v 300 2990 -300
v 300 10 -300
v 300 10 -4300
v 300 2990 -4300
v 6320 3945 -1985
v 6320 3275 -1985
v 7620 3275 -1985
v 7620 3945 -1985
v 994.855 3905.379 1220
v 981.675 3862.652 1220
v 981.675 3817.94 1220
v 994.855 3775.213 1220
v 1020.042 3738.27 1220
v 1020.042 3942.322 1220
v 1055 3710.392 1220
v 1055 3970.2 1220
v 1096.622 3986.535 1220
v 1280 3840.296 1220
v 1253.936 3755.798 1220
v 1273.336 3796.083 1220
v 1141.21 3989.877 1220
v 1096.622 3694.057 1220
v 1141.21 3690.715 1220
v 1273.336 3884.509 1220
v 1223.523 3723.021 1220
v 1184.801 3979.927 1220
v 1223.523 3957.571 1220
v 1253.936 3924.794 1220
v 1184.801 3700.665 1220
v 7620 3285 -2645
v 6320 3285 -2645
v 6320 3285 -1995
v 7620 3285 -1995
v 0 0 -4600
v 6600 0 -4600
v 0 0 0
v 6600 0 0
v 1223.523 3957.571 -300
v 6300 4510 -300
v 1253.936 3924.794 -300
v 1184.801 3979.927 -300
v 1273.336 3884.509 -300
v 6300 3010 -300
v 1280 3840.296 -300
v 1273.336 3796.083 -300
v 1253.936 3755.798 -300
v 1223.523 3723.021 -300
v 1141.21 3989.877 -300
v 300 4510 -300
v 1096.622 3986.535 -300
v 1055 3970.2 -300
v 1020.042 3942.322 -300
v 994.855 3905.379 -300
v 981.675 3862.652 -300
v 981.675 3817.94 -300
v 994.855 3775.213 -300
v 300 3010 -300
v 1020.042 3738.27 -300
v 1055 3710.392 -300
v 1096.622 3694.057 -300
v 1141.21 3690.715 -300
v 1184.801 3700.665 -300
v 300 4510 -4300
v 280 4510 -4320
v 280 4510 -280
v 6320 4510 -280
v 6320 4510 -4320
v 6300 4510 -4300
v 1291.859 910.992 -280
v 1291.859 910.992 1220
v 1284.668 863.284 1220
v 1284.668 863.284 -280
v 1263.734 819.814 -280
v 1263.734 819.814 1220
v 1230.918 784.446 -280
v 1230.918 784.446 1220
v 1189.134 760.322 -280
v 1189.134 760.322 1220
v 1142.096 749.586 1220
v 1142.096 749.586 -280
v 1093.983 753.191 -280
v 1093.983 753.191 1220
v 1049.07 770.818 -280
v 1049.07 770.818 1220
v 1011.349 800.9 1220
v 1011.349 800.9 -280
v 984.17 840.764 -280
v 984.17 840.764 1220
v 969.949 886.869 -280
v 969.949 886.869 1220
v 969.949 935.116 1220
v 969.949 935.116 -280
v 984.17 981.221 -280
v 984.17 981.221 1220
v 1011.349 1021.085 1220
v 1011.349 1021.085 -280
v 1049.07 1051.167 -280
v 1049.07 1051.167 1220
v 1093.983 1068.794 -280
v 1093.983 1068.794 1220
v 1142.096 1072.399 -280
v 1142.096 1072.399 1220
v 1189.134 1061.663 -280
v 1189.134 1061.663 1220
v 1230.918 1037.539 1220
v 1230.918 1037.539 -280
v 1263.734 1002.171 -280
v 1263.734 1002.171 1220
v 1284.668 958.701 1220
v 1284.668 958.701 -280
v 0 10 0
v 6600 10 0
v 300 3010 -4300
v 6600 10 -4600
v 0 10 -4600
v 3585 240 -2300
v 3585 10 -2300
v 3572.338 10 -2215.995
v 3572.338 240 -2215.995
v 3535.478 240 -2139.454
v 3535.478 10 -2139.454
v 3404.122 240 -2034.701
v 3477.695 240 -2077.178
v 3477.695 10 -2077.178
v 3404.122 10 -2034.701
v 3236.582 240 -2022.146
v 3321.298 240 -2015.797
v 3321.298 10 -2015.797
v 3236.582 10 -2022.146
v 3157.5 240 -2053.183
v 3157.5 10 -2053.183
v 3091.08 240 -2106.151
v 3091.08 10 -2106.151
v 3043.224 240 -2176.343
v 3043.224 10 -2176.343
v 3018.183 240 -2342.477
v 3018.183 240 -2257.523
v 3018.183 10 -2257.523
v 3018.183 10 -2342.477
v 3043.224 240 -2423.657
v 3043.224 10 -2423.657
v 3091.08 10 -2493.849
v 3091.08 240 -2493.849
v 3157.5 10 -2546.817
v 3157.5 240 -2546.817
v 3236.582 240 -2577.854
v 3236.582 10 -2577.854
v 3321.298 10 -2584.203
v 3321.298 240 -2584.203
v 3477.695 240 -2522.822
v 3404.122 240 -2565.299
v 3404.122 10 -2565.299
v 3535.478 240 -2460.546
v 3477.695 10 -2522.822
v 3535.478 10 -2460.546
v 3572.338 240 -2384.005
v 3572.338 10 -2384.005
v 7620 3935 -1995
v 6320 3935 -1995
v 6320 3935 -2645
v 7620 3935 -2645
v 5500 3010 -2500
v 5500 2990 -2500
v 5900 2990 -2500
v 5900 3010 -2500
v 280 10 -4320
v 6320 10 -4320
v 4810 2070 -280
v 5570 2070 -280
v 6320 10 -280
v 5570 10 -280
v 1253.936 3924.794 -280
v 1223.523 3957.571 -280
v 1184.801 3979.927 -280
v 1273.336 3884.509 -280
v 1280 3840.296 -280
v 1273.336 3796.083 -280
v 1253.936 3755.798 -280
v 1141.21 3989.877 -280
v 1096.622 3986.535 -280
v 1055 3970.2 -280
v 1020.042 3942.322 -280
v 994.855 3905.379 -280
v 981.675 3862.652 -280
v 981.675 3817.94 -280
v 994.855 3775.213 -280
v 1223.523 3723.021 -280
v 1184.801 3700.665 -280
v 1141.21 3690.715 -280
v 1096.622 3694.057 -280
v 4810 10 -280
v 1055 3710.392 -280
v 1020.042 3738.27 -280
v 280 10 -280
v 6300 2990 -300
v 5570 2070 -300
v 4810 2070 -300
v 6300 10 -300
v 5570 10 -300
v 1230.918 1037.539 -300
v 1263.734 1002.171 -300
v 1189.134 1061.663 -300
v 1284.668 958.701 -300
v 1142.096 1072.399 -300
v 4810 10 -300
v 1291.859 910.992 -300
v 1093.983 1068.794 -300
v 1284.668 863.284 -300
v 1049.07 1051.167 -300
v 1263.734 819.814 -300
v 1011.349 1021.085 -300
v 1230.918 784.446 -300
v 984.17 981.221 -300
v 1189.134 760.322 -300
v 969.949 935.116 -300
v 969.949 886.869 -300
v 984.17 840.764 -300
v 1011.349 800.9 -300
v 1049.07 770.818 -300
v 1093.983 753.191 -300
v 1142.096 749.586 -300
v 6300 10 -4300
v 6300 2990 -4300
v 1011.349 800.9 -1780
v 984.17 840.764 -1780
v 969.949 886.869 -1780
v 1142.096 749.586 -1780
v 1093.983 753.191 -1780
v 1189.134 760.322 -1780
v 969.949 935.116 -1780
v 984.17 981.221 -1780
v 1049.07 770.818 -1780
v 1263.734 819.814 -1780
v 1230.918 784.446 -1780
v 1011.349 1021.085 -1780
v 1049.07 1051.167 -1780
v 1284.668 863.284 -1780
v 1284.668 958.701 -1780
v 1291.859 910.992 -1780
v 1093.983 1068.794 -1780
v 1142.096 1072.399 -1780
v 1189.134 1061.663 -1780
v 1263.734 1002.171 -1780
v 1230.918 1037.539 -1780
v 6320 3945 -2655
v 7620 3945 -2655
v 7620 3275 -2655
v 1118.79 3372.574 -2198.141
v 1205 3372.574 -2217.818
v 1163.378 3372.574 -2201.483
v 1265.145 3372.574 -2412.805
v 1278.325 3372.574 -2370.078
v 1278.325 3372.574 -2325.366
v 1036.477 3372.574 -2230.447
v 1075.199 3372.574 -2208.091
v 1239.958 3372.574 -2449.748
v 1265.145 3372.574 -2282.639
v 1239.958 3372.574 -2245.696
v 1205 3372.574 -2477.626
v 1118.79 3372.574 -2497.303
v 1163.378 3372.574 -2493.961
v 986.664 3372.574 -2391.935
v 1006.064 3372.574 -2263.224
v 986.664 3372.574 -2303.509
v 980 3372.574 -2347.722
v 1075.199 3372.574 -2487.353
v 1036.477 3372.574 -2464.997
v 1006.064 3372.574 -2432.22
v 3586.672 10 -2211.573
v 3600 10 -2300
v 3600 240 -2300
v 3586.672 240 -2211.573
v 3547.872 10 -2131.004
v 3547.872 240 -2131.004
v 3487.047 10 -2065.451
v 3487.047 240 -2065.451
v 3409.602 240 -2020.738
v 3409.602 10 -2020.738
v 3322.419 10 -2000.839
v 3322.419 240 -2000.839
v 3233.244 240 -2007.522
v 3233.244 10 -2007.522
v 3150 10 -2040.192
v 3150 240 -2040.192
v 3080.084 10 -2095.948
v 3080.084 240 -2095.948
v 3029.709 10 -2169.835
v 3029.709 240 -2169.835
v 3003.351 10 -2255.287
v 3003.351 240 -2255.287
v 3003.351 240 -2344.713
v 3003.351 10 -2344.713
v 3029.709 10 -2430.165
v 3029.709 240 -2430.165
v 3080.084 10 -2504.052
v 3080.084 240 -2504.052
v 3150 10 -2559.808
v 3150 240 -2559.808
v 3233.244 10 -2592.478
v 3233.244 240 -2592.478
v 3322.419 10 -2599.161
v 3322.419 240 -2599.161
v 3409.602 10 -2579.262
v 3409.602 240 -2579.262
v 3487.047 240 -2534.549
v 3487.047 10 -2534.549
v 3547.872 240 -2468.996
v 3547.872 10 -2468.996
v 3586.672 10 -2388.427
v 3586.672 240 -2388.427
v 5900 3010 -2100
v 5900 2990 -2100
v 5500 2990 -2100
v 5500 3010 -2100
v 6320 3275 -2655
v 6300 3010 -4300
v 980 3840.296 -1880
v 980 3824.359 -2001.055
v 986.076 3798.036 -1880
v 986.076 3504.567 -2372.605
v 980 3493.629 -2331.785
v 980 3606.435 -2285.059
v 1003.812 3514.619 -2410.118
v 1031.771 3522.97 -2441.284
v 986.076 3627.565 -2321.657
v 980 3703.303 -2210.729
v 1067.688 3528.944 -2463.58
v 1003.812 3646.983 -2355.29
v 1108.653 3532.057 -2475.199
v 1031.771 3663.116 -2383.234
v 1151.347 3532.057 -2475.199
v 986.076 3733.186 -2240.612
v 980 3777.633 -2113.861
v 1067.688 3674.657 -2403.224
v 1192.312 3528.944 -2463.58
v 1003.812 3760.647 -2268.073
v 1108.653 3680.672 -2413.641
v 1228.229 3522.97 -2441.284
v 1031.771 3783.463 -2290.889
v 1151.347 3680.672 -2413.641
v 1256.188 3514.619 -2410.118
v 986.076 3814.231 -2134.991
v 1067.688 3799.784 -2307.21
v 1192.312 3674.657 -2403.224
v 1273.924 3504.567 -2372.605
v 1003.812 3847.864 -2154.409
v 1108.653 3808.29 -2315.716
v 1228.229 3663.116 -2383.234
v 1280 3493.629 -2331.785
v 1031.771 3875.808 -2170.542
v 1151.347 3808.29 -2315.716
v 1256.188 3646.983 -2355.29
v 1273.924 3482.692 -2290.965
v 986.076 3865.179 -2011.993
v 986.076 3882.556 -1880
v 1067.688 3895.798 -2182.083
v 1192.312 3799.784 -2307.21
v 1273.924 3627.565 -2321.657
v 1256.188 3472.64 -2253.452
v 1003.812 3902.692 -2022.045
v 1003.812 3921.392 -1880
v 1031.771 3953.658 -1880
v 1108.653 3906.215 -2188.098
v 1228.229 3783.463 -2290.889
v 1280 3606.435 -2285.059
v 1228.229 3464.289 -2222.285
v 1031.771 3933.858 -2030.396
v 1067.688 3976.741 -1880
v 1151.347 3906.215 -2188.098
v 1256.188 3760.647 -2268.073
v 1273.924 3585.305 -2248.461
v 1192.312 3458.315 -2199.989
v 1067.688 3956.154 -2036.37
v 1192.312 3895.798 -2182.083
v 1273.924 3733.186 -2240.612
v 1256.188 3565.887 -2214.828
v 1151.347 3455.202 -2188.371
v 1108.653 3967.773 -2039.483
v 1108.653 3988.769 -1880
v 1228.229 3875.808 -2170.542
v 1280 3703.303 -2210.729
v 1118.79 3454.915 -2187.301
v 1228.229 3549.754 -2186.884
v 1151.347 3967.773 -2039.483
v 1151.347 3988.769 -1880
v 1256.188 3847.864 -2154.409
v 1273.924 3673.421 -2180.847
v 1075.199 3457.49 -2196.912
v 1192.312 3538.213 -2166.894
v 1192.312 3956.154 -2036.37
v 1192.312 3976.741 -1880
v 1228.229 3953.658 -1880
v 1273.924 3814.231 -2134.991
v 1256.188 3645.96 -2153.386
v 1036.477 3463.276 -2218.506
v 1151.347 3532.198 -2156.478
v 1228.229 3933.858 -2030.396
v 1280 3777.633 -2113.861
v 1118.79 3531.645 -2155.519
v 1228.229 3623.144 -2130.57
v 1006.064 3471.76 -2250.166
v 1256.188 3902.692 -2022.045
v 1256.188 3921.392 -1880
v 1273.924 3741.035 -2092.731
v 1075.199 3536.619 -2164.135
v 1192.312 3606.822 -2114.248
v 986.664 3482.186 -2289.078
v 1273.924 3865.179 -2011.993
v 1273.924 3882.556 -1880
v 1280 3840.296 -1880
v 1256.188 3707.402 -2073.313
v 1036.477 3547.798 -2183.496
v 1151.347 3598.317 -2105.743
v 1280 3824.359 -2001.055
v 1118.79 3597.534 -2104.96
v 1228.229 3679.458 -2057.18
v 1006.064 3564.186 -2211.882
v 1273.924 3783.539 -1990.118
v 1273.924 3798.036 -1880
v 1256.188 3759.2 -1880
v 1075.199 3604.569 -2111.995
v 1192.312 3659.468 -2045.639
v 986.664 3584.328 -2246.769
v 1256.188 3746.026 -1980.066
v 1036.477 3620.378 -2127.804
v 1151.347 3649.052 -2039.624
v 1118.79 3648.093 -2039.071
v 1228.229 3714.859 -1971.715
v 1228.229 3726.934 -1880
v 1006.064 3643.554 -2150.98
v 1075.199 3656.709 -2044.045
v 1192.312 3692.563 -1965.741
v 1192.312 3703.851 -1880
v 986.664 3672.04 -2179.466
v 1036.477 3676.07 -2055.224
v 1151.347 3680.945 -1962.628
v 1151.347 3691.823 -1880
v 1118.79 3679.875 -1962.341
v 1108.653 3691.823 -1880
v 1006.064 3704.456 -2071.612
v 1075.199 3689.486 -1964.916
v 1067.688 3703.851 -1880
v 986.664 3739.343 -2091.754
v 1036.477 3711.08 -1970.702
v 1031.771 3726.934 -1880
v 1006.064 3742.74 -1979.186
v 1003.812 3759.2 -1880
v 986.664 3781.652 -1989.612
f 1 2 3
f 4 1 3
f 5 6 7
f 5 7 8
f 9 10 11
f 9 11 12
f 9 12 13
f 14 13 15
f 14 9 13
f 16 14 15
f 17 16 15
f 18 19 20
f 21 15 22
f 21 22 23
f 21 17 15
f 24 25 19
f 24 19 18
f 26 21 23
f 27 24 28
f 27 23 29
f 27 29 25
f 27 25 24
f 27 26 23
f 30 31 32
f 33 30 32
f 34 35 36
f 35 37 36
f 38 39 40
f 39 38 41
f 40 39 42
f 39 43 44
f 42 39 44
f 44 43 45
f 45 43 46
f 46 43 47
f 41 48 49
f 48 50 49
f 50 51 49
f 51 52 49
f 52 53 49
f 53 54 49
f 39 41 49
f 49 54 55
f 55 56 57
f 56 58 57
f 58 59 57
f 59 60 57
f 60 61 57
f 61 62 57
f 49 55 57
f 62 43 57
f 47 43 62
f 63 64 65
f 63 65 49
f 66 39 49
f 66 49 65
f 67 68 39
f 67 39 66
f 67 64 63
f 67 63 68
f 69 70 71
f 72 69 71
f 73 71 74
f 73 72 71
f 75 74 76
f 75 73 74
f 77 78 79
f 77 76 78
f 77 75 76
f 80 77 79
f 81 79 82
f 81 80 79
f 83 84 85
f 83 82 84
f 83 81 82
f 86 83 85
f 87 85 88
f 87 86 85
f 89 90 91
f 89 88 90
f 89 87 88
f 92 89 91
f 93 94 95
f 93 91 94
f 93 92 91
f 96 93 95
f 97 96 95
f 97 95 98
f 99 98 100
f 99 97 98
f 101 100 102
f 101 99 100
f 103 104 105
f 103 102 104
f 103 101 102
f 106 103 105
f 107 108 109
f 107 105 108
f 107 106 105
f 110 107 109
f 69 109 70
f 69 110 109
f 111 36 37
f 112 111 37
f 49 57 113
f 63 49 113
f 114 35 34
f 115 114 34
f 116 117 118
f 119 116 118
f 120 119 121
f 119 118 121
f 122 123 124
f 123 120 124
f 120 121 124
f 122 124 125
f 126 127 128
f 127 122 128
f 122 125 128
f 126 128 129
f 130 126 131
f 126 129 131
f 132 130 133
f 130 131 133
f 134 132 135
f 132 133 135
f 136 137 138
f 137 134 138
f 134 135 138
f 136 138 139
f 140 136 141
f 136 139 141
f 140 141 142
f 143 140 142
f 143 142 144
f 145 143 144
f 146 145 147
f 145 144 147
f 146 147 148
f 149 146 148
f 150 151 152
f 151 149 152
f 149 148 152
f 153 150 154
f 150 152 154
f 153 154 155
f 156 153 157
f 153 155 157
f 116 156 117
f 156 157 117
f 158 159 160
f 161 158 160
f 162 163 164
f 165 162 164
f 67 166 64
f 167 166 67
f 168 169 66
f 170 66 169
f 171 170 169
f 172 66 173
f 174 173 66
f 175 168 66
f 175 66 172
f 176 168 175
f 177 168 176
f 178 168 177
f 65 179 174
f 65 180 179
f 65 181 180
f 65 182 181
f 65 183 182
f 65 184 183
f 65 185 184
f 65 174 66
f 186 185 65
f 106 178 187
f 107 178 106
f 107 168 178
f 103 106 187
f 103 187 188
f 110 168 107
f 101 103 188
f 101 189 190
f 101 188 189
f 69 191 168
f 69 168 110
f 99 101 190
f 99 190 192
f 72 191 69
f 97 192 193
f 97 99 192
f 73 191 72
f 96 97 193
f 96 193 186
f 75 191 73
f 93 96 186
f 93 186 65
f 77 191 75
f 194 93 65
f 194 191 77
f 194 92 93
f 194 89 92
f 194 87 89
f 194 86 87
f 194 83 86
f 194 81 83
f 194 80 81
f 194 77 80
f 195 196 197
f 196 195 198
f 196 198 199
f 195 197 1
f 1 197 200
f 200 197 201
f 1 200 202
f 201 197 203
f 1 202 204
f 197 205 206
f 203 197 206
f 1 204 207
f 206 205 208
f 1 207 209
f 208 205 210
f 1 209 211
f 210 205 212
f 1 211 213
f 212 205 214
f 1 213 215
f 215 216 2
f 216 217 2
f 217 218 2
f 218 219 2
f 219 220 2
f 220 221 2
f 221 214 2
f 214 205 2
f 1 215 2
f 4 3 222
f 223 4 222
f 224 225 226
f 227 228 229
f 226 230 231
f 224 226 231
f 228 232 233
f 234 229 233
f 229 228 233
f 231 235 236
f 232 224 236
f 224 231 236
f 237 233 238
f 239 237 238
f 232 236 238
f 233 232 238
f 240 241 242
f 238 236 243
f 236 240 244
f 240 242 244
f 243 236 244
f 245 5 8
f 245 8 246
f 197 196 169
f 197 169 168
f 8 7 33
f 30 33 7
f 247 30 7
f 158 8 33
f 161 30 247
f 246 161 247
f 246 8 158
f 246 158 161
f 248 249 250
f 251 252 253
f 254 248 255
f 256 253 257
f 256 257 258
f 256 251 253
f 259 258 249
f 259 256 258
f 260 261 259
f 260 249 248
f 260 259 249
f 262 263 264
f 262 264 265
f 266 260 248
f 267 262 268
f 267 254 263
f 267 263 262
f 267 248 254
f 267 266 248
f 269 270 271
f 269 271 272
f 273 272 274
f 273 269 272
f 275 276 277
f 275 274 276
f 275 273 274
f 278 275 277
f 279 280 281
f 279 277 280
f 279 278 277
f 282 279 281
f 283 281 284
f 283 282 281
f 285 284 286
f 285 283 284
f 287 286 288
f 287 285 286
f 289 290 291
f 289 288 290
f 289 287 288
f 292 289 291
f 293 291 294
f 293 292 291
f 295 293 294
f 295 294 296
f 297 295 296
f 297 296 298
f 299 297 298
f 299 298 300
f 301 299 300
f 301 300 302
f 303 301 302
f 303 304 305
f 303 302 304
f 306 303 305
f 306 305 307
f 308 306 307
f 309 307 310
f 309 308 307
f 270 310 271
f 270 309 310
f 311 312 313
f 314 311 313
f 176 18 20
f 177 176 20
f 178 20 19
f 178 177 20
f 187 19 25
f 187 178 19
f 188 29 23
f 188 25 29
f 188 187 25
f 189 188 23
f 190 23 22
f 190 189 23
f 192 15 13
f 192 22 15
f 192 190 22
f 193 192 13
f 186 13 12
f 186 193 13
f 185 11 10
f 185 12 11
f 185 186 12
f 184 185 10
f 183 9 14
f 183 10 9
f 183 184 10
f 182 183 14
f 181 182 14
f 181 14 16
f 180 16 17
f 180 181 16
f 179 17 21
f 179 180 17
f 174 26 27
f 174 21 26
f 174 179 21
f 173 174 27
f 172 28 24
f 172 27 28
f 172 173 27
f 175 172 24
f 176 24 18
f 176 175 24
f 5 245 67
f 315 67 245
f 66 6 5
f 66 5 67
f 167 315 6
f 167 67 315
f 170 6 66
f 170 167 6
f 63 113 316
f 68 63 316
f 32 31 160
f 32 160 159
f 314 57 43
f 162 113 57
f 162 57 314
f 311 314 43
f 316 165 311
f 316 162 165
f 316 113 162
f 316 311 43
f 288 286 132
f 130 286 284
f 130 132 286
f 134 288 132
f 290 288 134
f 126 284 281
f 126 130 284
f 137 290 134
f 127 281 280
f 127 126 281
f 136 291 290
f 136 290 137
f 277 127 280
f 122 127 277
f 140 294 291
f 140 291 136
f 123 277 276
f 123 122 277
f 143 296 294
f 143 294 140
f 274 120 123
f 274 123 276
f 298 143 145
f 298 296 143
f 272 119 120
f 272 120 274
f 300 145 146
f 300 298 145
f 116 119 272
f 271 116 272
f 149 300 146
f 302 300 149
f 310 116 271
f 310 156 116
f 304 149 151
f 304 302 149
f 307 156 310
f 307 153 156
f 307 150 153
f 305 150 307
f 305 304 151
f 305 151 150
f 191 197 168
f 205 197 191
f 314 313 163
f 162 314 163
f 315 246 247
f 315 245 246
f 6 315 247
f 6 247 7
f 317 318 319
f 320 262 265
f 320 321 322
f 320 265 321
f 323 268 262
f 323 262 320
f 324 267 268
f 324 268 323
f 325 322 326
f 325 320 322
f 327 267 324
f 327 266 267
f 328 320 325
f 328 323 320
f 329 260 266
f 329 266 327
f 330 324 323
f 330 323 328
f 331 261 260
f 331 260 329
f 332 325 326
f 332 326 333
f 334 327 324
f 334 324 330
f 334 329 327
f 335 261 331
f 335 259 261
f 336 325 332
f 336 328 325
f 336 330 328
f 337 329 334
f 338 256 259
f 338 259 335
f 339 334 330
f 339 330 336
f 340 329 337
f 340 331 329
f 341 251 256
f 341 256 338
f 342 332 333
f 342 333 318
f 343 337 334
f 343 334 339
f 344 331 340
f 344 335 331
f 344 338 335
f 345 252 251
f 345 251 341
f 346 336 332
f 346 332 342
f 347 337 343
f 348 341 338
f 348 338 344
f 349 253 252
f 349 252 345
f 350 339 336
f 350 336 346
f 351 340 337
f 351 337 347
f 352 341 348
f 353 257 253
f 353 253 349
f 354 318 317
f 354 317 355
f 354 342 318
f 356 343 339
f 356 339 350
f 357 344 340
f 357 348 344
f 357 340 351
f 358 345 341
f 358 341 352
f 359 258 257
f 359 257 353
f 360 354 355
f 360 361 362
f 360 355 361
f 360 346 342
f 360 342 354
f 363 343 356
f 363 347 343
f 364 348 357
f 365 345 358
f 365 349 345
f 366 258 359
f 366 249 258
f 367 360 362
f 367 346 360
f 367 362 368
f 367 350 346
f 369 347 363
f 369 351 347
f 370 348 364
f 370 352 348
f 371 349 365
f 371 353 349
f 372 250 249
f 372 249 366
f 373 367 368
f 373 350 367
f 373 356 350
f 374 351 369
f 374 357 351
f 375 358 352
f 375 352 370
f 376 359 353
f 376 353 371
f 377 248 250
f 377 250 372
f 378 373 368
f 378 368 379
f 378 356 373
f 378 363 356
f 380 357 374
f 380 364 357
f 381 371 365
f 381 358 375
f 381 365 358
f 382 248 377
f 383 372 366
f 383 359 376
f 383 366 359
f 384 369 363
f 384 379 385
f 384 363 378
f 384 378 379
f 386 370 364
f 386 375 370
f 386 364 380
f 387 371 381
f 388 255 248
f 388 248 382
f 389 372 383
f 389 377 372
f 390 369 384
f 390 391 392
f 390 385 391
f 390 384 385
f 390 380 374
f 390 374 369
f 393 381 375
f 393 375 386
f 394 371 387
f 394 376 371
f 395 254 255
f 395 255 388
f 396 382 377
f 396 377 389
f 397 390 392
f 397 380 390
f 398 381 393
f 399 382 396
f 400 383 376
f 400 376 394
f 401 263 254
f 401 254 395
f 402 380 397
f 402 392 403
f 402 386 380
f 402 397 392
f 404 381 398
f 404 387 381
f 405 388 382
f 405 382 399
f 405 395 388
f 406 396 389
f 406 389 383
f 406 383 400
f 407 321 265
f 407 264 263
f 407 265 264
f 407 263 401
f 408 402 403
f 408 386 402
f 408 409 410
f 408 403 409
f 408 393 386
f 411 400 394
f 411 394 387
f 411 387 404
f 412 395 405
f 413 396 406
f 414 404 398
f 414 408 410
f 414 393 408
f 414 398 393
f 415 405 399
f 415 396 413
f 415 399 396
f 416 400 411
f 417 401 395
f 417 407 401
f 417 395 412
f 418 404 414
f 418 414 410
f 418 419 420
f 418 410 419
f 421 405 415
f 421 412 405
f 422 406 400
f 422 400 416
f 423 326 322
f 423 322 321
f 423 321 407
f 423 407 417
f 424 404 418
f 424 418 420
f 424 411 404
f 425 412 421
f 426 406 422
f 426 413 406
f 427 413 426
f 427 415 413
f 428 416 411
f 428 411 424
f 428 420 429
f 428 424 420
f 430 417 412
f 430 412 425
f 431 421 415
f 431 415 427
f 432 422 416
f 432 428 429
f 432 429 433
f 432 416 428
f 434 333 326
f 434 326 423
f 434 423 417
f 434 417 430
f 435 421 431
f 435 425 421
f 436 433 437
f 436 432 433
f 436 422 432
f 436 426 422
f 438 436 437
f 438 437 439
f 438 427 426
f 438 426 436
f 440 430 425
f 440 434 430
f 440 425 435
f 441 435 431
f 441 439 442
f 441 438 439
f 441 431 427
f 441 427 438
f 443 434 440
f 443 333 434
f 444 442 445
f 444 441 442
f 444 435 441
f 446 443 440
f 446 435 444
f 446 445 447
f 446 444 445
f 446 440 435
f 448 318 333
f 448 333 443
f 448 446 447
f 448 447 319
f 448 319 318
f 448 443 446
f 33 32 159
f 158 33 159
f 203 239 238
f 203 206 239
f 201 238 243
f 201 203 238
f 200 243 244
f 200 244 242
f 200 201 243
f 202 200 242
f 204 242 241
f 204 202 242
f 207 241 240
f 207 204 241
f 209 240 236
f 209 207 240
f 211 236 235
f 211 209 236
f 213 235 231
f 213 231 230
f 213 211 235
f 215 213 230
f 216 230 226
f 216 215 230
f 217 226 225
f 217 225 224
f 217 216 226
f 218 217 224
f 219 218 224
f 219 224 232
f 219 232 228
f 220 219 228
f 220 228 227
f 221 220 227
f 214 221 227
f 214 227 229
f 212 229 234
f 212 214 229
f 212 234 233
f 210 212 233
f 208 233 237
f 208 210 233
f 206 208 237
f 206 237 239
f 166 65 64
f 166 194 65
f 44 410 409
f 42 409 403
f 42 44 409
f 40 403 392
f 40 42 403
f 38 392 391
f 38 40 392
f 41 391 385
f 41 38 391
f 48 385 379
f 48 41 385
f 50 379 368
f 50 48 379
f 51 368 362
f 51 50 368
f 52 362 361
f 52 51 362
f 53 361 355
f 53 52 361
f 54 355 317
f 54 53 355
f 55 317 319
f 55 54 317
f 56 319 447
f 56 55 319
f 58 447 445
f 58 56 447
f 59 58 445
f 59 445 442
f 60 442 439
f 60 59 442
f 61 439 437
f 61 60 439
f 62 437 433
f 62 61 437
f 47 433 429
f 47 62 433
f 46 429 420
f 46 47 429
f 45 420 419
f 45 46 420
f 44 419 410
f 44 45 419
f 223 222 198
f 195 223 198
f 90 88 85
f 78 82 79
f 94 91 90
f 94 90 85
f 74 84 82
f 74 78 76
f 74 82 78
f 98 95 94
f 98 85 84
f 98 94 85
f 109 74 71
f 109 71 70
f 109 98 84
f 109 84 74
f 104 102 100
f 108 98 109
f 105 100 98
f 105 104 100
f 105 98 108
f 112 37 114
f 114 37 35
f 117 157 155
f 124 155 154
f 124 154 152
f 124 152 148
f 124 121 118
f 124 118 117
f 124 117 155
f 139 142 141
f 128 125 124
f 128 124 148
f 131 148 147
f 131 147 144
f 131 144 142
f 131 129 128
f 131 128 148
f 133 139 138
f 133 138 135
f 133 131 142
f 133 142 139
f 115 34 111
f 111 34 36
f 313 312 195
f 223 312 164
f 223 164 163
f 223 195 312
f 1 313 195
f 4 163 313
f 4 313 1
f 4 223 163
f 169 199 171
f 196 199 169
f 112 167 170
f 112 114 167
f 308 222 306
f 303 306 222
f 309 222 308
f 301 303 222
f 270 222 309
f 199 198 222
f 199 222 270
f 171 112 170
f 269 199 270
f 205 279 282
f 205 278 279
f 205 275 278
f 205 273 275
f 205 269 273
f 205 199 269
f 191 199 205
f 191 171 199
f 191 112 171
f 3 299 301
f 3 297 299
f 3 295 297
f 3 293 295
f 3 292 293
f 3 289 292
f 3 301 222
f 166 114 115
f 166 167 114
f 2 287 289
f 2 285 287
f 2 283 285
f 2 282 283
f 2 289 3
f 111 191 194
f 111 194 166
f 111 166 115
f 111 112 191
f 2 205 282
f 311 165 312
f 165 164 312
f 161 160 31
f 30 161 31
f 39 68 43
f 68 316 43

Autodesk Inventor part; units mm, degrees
ref_plane "YZ Plane" through (0, 0, 0) normal (1, 0, 0) x (0, 1, 0)
ref_plane "XZ Plane" through (0, 0, 0) normal (0, 1, 0) x (-1, 0, 0)
ref_plane "XY Plane" through (0, 0, 0) normal (0, 0, 1) x (1, 0, 0)
sketch "Sketch1" plane through (0, 0, 0) normal (0, 1, 0) x (-1, 0, 0)
  line L0 (0, 0) -> (-6600, 0)
  line L1 (-6600, 0) -> (-6600, -4600)
  line L2 (-6600, -4600) -> (0, -4600)
  line L3 (0, -4600) -> (0, 0)
  dimension "d0" = 6600
  dimension "d2" = 4600
extrude "Extrusion1" add sketch "Sketch1" along normal blind 10
sketch "Sketch2" plane through (0, 10, 0) normal (0, 1, 0) x (1, 0, 0)
  line L0 (0, 0) -> (6600, 0) projected
  line L1 (6600, 0) -> (6600, 4600) projected
  line L2 (6600, 4600) -> (0, 4600) projected
  line L3 (0, 4600) -> (0, 0) projected
  line L4 (300, 4300) -> (6300, 4300)
  line L5 (6300, 4300) -> (6300, 300)
  line L6 (6300, 300) -> (300, 300)
  line L7 (300, 300) -> (300, 4300)
  line L8 (280, 4320) -> (6320, 4320)
  line L9 (6320, 4320) -> (6320, 280)
  line L10 (6320, 280) -> (280, 280)
  line L11 (280, 280) -> (280, 4320)
  dimension "d5" = 300
  dimension "d6" = 300
  dimension "d7" = 300
  dimension "d8" = 300
  dimension "d9" = 20
  dimension "d10" = 20
  dimension "d11" = 20
  dimension "d12" = 20
extrude "Extrusion2" add sketch "Sketch2" along normal blind 4500 contours L8 L9 L10 L11
sketch "Sketch3" plane through (280, 10, -280) normal (0, 0, 1) x (1, 0, 0)
  line L0 (6040, 0) -> (0, 0) projected
  line L1 (6040, 0) -> (6040, 4500) projected
  line L2 (4530, 0) -> (5290, 0)
  line L3 (5290, 0) -> (5290, 2060)
  line L4 (5290, 2060) -> (4530, 2060)
  line L5 (4530, 2060) -> (4530, 0)
  point P0 (-280, -10)
  dimension "d15" = 750
  dimension "d16" = 760
  dimension "d17" = 2060
extrude "Extrusion3" cut sketch "Sketch3" along normal mid plane 40
sketch "Sketch4" plane through (300, 10, -4300) normal (0, 0, 1) x (1, 0, 0)
  line L0 (6000, 0) -> (0, 0) projected
  line L1 (6000, 0) -> (6000, 4500) projected
  line L2 (0, 4500) -> (6000, 4500) projected
  line L3 (0, 0) -> (0, 4500) projected
  point P0 (-300, -10)
sketch "Sketch5" plane through (300, 10, -4300) normal (0, 0, 1) x (1, 0, 0)
  line L0 (6000, 0) -> (6000, 4500) projected
  line L1 (0, 4500) -> (6000, 4500) projected
  line L2 (0, 0) -> (0, 4500) projected
  line L3 (0, 3000) -> (6000, 3000)
  line L4 (6000, 3000) -> (6000, 2980)
  line L5 (6000, 2980) -> (0, 2980)
  line L6 (0, 2980) -> (0, 3000)
  point P0 (-300, -10)
  dimension "d20" = 1500
  dimension "d21" = 20
extrude "Extrusion4" add sketch "Sketch5" along normal up to next contours L5 L2 L3 L0
sketch "Sketch7" plane through (300, 3010, -4300) normal (0, 1, 0) x (1, 0, 0)
  line L0 (6000, -4000) -> (0, -4000) projected
  line L1 (6000, 0) -> (6000, -4000) projected
  line L2 (5200, -1800) -> (5600, -1800)
  line L3 (5600, -1800) -> (5600, -2200)
  line L4 (5600, -2200) -> (5200, -2200)
  line L5 (5200, -2200) -> (5200, -1800)
  point P0 (-300, -4300)
  dimension "d31" = 400
  dimension "d33" = 400
  dimension "d34" = 1800
  dimension "d35" = 400
extrude "Extrusion6" cut sketch "Sketch7" along normal mid plane 40
sketch "Sketch8" plane through (280, 4510, -280) normal (0, 0, 1) x (1, 0, 0)
  circle A0 centre (850, -669.704) radius 150
  line L0 (0, -4500) -> (0, 0) projected
  point P0 (-280, -4510)
  dimension "d38" = 300
  dimension "d70" = 850
extrude "Extrusion7" add sketch "Sketch8" along normal blind 1500 and the other way blind 1600
sketch "Sketch9" plane through (1130, 3840.296, -1880) normal (0, 0, -1) x (-1, 0, 0)
  circle A0 centre (0, 0) radius 150 projected
  circle A1 centre (0, 0) radius 150
  line L0 (150, -467.722) -> (-150, -467.722)
  point P0 (1130, -3840.296)
  dimension "d44" = 300
revolve "Revolution1" add sketch "Sketch9" angle 90 about axis through (980, 3372.574, -1880) along (-1, 0, 0)
sketch "Sketch10" plane through (6320, 10, -280) normal (1, 0, 0) x (0, 0, -1)
  line L0 (4040, 0) -> (0, 0) projected
  line L1 (4040, 0) -> (4040, 4500) projected
  line L2 (1715, 3925) -> (2365, 3925)
  line L3 (2365, 3925) -> (2365, 3275)
  line L4 (2365, 3275) -> (1715, 3275)
  line L5 (1715, 3275) -> (1715, 3925)
  line L6 (1705, 3935) -> (2375, 3935)
  line L7 (2375, 3935) -> (2375, 3265)
  line L8 (2375, 3265) -> (1705, 3265)
  line L9 (1705, 3265) -> (1705, 3935)
  point P0 (-280, -10)
  dimension "d46" = 650
  dimension "d48" = 650
  dimension "d49" = 3275
  dimension "d50" = 1675
  dimension "d51" = 10
  dimension "d52" = 10
  dimension "d53" = 10
  dimension "d54" = 10
extrude "Extrusion9" add sketch "Sketch10" along normal blind 1300
sketch "Sketch11" plane through (0, 10, 0) normal (0, 1, 0) x (1, 0, 0)
  line L0 (0, 0) -> (6600, 0) projected
  line L1 (0, 4600) -> (0, 0) projected
  circle A0 centre (3300, 2300) radius 285
  circle A1 centre (3300, 2300) radius 300
  dimension "d59" = 570
  dimension "d61" = 2300
  dimension "d62" = 3300
  dimension "d63" = 600
extrude "Extrusion10" add sketch "Sketch11" along normal blind 230
sketch "Sketch12" plane through (280, 4510, -280) normal (0, 0, 1) x (1, 0, 0)
  circle A0 centre (850, -3599.0075) radius 161.8593
  line L0 (0, -4500) -> (0, 0) projected
  point P0 (-280, -4510)
  dimension "d71" = 850
extrude "Extrusion11" add sketch "Sketch12" along normal blind 1500 and the other way blind 1500
properties part number "LLNL_Enclosure_Drawing"
